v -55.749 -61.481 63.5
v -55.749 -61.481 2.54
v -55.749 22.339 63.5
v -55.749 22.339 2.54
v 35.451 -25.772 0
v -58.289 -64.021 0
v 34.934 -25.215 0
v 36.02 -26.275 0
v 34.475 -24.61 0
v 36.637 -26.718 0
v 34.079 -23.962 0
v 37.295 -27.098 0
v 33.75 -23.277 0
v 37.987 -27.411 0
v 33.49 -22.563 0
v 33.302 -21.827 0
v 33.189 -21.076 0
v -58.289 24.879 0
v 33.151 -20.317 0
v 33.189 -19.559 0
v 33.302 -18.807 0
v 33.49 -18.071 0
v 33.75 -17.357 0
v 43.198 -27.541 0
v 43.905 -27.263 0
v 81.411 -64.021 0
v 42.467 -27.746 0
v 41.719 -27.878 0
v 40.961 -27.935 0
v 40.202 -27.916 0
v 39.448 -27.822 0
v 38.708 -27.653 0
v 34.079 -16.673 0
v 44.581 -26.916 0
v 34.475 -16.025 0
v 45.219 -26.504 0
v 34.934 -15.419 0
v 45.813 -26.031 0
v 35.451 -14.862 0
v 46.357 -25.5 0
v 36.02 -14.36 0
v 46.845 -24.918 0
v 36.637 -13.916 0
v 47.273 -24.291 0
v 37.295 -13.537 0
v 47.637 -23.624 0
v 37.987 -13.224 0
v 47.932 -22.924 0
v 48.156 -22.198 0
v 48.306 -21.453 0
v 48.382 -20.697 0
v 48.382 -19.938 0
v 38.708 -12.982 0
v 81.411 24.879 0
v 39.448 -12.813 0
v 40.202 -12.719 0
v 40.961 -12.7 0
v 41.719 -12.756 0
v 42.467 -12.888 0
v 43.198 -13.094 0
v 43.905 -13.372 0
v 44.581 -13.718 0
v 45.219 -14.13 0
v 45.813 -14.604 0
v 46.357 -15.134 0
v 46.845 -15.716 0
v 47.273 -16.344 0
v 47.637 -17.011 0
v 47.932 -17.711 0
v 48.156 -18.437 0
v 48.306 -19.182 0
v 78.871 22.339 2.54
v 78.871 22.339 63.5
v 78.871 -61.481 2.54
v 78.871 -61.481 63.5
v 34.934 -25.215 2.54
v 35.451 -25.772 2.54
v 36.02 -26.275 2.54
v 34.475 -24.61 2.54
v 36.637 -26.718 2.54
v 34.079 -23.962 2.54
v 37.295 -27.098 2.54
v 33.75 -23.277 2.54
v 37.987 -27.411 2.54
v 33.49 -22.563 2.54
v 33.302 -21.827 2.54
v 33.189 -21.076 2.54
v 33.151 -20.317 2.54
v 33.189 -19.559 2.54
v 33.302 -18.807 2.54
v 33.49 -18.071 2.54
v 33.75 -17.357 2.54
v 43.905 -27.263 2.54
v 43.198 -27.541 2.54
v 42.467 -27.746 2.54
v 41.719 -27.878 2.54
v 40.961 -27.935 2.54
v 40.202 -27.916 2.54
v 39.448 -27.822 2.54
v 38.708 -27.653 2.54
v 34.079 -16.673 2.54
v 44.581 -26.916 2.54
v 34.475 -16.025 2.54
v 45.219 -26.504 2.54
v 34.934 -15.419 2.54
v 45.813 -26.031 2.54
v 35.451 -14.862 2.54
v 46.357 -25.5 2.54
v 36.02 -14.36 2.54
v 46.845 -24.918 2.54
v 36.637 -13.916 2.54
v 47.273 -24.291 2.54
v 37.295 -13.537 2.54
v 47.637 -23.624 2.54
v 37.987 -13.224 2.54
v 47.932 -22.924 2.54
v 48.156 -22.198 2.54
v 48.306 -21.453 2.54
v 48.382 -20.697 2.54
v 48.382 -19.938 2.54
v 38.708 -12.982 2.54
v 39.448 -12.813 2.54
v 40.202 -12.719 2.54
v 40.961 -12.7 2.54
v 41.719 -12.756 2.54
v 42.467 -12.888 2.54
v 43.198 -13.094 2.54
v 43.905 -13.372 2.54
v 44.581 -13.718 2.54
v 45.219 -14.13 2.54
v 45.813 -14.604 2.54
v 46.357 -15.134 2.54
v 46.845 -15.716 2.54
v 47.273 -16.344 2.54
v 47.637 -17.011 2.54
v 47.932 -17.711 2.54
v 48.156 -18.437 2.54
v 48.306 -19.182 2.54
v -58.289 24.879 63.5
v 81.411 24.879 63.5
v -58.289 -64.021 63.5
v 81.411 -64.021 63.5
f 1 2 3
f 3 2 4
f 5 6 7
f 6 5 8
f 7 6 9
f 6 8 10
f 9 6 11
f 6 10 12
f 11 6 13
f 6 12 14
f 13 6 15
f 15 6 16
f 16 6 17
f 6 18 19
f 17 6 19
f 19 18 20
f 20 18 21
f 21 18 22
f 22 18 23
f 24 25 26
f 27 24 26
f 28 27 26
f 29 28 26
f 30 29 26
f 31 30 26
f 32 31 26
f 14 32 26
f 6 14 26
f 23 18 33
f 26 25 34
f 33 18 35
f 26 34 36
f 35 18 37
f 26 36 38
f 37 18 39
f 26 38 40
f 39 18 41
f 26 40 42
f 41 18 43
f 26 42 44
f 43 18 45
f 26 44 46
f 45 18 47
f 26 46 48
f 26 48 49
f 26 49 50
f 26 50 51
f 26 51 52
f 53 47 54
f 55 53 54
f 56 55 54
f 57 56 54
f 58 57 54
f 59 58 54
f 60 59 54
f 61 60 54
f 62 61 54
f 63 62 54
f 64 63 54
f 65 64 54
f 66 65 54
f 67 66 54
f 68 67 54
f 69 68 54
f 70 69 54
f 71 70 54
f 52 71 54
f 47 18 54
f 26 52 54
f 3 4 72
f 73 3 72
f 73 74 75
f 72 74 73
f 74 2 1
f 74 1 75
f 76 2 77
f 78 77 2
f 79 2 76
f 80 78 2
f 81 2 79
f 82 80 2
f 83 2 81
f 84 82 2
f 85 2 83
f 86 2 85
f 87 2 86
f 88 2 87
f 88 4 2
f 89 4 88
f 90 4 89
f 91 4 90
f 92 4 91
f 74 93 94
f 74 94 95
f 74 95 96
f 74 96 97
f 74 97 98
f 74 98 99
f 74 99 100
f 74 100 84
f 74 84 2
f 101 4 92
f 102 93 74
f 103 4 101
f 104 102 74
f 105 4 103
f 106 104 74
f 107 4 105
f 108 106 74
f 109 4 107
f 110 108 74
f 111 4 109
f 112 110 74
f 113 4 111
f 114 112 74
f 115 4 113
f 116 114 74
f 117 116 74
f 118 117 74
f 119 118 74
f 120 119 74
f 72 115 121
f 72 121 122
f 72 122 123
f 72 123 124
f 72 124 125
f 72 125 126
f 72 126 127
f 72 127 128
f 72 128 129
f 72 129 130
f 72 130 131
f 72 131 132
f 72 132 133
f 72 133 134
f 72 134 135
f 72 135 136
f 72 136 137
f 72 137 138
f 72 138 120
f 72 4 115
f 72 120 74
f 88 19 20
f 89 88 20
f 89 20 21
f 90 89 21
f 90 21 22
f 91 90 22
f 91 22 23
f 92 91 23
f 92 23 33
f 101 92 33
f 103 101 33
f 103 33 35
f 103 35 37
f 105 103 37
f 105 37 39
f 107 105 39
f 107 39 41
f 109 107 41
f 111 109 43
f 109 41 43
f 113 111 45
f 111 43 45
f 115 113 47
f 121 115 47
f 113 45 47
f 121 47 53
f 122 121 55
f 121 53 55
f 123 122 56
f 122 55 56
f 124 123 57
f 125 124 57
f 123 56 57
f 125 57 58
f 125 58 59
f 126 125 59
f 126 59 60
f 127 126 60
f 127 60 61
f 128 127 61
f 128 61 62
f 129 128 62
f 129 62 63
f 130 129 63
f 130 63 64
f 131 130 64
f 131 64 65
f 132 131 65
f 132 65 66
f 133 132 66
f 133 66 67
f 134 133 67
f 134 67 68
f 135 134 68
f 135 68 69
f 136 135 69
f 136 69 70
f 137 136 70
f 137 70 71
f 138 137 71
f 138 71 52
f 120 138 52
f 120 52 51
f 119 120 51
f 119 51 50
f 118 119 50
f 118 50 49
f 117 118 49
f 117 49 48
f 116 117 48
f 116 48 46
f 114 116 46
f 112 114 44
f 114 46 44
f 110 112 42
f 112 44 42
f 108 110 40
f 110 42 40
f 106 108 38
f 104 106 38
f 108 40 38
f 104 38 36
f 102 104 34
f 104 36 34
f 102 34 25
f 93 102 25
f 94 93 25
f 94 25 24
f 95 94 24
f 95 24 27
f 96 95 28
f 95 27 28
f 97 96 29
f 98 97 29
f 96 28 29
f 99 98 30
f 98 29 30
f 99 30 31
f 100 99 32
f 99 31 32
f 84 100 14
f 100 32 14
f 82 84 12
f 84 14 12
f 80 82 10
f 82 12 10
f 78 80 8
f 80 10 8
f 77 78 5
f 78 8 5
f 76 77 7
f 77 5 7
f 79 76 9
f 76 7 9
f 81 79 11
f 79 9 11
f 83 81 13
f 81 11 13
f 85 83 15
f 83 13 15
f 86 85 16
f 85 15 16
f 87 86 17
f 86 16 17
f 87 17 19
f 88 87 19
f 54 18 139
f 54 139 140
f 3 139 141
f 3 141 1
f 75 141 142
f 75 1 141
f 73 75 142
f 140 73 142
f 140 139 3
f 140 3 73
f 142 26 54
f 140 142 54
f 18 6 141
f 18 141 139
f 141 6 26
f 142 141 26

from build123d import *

# Parameters (mm, degrees)
SKETCH1_W           = 139.7
SKETCH1_H           = 88.9
BOSS_EXTRUDE1_DEPTH = 63.5
SHELL1_T            = -2.54
SKETCH2_R           = 7.62
CUT_EXTRUDE1_DEPTH  = 76.2


with BuildPart() as part:
    # Sketch1 → Boss-Extrude1 (new body)
    with BuildSketch(Plane.XY):
        with Locations((11.561325185, -19.571420525)):
            Rectangle(SKETCH1_W, SKETCH1_H)
    extrude(amount=BOSS_EXTRUDE1_DEPTH)

    # Shell1
    shell1_openings = [part.faces().sort_by_distance(p)[0] for p in [
        (11.561325185, -19.571420525, 63.5),
    ]]
    offset(amount=SHELL1_T, openings=shell1_openings, kind=Kind.INTERSECTION)

    # Sketch2 → Cut-Extrude1 (cut)
    with BuildSketch(Plane(origin=(0, 0, 0), x_dir=(-1, 0, 0), z_dir=(0, 0, -1))):
        with Locations((-40.771325185, -20.31733829)):
            Circle(SKETCH2_R)
    extrude(amount=-CUT_EXTRUDE1_DEPTH, mode=Mode.SUBTRACT)


solid = part.part
